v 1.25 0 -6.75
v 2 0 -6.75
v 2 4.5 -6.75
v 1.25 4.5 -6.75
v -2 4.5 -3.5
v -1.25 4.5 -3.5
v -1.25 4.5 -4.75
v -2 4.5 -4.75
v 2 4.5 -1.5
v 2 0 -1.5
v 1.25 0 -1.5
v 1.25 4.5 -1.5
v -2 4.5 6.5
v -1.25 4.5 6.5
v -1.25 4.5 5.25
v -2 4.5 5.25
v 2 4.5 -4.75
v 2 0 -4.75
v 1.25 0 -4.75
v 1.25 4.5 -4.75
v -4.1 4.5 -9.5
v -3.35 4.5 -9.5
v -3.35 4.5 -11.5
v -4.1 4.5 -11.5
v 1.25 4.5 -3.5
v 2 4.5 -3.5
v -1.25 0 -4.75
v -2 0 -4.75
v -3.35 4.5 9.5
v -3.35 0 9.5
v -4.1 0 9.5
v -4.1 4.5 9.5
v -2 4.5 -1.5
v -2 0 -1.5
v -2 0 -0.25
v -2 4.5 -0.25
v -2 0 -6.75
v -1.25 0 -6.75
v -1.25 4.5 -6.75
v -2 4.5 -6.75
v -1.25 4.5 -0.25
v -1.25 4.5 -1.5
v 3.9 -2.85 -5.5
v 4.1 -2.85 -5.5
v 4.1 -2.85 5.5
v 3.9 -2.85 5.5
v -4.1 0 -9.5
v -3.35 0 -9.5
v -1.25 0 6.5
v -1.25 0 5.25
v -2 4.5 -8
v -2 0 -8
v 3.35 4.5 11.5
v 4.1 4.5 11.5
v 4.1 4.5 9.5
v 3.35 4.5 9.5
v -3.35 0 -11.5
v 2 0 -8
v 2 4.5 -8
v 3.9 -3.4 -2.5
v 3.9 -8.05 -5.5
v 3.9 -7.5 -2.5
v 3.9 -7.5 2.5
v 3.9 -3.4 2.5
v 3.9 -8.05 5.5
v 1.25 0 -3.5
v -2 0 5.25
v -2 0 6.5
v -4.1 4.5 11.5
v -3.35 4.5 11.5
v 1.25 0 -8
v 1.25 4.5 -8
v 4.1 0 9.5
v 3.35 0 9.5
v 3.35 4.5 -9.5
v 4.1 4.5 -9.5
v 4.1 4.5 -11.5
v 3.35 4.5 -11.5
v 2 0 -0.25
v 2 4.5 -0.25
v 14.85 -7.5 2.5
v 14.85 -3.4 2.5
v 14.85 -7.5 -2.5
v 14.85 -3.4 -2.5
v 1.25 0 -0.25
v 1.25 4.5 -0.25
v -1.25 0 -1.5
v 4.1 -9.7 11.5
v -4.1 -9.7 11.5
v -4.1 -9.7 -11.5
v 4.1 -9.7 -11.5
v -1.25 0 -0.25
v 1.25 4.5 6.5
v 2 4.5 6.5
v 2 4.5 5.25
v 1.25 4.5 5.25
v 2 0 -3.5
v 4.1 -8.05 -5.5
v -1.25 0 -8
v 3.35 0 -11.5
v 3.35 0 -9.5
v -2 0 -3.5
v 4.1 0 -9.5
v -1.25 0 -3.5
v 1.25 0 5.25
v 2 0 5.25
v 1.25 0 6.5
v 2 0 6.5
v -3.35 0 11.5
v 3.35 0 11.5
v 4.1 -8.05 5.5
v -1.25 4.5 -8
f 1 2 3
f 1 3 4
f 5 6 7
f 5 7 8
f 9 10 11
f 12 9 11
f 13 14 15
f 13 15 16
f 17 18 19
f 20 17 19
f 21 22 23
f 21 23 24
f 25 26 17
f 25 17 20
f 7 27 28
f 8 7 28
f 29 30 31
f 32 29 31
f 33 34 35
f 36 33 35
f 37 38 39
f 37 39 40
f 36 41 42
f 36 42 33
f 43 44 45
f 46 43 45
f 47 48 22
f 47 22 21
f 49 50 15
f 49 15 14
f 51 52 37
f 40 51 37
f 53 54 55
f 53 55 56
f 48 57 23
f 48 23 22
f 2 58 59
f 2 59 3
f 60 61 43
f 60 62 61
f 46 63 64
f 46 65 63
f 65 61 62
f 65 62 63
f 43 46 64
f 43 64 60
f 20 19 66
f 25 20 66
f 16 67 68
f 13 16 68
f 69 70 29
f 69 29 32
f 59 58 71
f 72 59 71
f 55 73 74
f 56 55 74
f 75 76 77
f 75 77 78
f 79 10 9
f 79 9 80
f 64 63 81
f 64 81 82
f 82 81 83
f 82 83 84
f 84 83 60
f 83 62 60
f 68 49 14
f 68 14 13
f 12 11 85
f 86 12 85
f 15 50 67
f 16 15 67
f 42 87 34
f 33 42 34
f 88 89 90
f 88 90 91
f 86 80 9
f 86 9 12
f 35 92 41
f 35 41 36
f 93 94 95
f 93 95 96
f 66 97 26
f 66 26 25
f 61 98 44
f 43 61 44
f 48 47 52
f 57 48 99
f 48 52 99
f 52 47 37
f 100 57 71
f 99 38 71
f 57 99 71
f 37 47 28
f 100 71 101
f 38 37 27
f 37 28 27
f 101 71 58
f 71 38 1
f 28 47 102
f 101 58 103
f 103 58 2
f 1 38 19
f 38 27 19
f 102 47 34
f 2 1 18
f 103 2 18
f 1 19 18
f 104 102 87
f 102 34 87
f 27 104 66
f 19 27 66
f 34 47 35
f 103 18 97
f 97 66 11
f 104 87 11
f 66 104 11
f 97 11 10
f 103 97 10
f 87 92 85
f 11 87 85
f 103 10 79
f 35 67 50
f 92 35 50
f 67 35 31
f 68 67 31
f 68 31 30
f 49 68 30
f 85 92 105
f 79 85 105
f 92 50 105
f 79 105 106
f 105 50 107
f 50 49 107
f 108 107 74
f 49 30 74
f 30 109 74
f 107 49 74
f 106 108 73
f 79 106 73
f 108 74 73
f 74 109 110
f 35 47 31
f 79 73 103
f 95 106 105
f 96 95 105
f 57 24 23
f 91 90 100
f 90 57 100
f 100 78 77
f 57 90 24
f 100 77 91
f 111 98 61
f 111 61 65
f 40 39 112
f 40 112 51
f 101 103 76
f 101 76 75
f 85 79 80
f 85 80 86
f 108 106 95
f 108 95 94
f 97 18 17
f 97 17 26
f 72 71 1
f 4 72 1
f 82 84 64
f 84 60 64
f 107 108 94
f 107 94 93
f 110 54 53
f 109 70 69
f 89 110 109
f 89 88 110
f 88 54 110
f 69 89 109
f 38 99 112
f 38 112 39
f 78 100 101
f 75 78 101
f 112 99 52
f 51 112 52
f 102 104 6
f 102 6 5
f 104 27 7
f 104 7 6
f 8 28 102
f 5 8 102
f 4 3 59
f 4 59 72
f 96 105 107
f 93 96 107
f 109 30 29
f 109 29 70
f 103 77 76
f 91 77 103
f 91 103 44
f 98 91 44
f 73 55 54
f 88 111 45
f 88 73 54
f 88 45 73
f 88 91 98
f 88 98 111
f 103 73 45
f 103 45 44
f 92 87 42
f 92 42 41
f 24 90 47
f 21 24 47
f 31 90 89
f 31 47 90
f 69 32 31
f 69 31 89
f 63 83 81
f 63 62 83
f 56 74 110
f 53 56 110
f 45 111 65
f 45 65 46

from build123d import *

# Parameters (mm, degrees)
F0_W      = 8.2
F0_H      = 23
F1_DEPTH  = 9.7
F2_W      = 5.2
F2_H      = 11
F2_W_2    = 4.1
F2_H_2    = 5
F3_DEPTH  = 0.2
F3_FACE_W = 4.1
F3_FACE_H = 5
F4_DEPTH  = 10.75
F5_W      = 0.75
F5_H      = 2
F5_H_2    = 1.25
F6_DEPTH  = 4.5


with BuildPart() as f1:
    # F0 (on Front) → F1 (new body)
    with BuildSketch(Plane.XZ):
        Rectangle(F0_W, F0_H)
    extrude(amount=F1_DEPTH)

    # F2 (on face) → F3 (cut)
    with BuildSketch(Plane.YZ.offset(4.1)):
        with Locations((-5.45, 0)):
            Rectangle(F2_W, F2_H)
        with Locations((-5.45, 0)):
            Rectangle(F2_W_2, F2_H_2, mode=Mode.SUBTRACT)
    extrude(amount=-F3_DEPTH, mode=Mode.SUBTRACT)

    # F3_face (on face) → F4 (join)
    with BuildSketch(Plane(origin=(4.1, -5.45, 0), x_dir=(0, 1, 0), z_dir=(1, 0, 0))):
        Rectangle(F3_FACE_W, F3_FACE_H)
    extrude(amount=F4_DEPTH)

    # F5 (on face) → F6 (join)
    with BuildSketch(Plane(origin=(0, 0, 0), x_dir=(-1, 0, 0), z_dir=(0, 1, 0))):
        with Locations((-3.725, 10.5)):
            Rectangle(F5_W, F5_H)
        with Locations((3.725, 10.5)):
            Rectangle(F5_W, F5_H)
        with Locations((3.725, -10.5)):
            Rectangle(F5_W, F5_H)
        with Locations((-3.725, -10.5)):
            Rectangle(F5_W, F5_H)
        with Locations((-1.625, -7.375)):
            Rectangle(F5_W, F5_H_2)
        with Locations((1.625, -7.375)):
            Rectangle(F5_W, F5_H_2)
        with Locations((1.625, -4.125)):
            Rectangle(F5_W, F5_H_2)
        with Locations((-1.625, -4.125)):
            Rectangle(F5_W, F5_H_2)
        with Locations((-1.625, -0.875)):
            Rectangle(F5_W, F5_H_2)
        with Locations((1.625, -0.875)):
            Rectangle(F5_W, F5_H_2)
        with Locations((1.625, 5.875)):
            Rectangle(F5_W, F5_H_2)
        with Locations((-1.625, 5.875)):
            Rectangle(F5_W, F5_H_2)
    extrude(amount=F6_DEPTH)


solid = f1.part
